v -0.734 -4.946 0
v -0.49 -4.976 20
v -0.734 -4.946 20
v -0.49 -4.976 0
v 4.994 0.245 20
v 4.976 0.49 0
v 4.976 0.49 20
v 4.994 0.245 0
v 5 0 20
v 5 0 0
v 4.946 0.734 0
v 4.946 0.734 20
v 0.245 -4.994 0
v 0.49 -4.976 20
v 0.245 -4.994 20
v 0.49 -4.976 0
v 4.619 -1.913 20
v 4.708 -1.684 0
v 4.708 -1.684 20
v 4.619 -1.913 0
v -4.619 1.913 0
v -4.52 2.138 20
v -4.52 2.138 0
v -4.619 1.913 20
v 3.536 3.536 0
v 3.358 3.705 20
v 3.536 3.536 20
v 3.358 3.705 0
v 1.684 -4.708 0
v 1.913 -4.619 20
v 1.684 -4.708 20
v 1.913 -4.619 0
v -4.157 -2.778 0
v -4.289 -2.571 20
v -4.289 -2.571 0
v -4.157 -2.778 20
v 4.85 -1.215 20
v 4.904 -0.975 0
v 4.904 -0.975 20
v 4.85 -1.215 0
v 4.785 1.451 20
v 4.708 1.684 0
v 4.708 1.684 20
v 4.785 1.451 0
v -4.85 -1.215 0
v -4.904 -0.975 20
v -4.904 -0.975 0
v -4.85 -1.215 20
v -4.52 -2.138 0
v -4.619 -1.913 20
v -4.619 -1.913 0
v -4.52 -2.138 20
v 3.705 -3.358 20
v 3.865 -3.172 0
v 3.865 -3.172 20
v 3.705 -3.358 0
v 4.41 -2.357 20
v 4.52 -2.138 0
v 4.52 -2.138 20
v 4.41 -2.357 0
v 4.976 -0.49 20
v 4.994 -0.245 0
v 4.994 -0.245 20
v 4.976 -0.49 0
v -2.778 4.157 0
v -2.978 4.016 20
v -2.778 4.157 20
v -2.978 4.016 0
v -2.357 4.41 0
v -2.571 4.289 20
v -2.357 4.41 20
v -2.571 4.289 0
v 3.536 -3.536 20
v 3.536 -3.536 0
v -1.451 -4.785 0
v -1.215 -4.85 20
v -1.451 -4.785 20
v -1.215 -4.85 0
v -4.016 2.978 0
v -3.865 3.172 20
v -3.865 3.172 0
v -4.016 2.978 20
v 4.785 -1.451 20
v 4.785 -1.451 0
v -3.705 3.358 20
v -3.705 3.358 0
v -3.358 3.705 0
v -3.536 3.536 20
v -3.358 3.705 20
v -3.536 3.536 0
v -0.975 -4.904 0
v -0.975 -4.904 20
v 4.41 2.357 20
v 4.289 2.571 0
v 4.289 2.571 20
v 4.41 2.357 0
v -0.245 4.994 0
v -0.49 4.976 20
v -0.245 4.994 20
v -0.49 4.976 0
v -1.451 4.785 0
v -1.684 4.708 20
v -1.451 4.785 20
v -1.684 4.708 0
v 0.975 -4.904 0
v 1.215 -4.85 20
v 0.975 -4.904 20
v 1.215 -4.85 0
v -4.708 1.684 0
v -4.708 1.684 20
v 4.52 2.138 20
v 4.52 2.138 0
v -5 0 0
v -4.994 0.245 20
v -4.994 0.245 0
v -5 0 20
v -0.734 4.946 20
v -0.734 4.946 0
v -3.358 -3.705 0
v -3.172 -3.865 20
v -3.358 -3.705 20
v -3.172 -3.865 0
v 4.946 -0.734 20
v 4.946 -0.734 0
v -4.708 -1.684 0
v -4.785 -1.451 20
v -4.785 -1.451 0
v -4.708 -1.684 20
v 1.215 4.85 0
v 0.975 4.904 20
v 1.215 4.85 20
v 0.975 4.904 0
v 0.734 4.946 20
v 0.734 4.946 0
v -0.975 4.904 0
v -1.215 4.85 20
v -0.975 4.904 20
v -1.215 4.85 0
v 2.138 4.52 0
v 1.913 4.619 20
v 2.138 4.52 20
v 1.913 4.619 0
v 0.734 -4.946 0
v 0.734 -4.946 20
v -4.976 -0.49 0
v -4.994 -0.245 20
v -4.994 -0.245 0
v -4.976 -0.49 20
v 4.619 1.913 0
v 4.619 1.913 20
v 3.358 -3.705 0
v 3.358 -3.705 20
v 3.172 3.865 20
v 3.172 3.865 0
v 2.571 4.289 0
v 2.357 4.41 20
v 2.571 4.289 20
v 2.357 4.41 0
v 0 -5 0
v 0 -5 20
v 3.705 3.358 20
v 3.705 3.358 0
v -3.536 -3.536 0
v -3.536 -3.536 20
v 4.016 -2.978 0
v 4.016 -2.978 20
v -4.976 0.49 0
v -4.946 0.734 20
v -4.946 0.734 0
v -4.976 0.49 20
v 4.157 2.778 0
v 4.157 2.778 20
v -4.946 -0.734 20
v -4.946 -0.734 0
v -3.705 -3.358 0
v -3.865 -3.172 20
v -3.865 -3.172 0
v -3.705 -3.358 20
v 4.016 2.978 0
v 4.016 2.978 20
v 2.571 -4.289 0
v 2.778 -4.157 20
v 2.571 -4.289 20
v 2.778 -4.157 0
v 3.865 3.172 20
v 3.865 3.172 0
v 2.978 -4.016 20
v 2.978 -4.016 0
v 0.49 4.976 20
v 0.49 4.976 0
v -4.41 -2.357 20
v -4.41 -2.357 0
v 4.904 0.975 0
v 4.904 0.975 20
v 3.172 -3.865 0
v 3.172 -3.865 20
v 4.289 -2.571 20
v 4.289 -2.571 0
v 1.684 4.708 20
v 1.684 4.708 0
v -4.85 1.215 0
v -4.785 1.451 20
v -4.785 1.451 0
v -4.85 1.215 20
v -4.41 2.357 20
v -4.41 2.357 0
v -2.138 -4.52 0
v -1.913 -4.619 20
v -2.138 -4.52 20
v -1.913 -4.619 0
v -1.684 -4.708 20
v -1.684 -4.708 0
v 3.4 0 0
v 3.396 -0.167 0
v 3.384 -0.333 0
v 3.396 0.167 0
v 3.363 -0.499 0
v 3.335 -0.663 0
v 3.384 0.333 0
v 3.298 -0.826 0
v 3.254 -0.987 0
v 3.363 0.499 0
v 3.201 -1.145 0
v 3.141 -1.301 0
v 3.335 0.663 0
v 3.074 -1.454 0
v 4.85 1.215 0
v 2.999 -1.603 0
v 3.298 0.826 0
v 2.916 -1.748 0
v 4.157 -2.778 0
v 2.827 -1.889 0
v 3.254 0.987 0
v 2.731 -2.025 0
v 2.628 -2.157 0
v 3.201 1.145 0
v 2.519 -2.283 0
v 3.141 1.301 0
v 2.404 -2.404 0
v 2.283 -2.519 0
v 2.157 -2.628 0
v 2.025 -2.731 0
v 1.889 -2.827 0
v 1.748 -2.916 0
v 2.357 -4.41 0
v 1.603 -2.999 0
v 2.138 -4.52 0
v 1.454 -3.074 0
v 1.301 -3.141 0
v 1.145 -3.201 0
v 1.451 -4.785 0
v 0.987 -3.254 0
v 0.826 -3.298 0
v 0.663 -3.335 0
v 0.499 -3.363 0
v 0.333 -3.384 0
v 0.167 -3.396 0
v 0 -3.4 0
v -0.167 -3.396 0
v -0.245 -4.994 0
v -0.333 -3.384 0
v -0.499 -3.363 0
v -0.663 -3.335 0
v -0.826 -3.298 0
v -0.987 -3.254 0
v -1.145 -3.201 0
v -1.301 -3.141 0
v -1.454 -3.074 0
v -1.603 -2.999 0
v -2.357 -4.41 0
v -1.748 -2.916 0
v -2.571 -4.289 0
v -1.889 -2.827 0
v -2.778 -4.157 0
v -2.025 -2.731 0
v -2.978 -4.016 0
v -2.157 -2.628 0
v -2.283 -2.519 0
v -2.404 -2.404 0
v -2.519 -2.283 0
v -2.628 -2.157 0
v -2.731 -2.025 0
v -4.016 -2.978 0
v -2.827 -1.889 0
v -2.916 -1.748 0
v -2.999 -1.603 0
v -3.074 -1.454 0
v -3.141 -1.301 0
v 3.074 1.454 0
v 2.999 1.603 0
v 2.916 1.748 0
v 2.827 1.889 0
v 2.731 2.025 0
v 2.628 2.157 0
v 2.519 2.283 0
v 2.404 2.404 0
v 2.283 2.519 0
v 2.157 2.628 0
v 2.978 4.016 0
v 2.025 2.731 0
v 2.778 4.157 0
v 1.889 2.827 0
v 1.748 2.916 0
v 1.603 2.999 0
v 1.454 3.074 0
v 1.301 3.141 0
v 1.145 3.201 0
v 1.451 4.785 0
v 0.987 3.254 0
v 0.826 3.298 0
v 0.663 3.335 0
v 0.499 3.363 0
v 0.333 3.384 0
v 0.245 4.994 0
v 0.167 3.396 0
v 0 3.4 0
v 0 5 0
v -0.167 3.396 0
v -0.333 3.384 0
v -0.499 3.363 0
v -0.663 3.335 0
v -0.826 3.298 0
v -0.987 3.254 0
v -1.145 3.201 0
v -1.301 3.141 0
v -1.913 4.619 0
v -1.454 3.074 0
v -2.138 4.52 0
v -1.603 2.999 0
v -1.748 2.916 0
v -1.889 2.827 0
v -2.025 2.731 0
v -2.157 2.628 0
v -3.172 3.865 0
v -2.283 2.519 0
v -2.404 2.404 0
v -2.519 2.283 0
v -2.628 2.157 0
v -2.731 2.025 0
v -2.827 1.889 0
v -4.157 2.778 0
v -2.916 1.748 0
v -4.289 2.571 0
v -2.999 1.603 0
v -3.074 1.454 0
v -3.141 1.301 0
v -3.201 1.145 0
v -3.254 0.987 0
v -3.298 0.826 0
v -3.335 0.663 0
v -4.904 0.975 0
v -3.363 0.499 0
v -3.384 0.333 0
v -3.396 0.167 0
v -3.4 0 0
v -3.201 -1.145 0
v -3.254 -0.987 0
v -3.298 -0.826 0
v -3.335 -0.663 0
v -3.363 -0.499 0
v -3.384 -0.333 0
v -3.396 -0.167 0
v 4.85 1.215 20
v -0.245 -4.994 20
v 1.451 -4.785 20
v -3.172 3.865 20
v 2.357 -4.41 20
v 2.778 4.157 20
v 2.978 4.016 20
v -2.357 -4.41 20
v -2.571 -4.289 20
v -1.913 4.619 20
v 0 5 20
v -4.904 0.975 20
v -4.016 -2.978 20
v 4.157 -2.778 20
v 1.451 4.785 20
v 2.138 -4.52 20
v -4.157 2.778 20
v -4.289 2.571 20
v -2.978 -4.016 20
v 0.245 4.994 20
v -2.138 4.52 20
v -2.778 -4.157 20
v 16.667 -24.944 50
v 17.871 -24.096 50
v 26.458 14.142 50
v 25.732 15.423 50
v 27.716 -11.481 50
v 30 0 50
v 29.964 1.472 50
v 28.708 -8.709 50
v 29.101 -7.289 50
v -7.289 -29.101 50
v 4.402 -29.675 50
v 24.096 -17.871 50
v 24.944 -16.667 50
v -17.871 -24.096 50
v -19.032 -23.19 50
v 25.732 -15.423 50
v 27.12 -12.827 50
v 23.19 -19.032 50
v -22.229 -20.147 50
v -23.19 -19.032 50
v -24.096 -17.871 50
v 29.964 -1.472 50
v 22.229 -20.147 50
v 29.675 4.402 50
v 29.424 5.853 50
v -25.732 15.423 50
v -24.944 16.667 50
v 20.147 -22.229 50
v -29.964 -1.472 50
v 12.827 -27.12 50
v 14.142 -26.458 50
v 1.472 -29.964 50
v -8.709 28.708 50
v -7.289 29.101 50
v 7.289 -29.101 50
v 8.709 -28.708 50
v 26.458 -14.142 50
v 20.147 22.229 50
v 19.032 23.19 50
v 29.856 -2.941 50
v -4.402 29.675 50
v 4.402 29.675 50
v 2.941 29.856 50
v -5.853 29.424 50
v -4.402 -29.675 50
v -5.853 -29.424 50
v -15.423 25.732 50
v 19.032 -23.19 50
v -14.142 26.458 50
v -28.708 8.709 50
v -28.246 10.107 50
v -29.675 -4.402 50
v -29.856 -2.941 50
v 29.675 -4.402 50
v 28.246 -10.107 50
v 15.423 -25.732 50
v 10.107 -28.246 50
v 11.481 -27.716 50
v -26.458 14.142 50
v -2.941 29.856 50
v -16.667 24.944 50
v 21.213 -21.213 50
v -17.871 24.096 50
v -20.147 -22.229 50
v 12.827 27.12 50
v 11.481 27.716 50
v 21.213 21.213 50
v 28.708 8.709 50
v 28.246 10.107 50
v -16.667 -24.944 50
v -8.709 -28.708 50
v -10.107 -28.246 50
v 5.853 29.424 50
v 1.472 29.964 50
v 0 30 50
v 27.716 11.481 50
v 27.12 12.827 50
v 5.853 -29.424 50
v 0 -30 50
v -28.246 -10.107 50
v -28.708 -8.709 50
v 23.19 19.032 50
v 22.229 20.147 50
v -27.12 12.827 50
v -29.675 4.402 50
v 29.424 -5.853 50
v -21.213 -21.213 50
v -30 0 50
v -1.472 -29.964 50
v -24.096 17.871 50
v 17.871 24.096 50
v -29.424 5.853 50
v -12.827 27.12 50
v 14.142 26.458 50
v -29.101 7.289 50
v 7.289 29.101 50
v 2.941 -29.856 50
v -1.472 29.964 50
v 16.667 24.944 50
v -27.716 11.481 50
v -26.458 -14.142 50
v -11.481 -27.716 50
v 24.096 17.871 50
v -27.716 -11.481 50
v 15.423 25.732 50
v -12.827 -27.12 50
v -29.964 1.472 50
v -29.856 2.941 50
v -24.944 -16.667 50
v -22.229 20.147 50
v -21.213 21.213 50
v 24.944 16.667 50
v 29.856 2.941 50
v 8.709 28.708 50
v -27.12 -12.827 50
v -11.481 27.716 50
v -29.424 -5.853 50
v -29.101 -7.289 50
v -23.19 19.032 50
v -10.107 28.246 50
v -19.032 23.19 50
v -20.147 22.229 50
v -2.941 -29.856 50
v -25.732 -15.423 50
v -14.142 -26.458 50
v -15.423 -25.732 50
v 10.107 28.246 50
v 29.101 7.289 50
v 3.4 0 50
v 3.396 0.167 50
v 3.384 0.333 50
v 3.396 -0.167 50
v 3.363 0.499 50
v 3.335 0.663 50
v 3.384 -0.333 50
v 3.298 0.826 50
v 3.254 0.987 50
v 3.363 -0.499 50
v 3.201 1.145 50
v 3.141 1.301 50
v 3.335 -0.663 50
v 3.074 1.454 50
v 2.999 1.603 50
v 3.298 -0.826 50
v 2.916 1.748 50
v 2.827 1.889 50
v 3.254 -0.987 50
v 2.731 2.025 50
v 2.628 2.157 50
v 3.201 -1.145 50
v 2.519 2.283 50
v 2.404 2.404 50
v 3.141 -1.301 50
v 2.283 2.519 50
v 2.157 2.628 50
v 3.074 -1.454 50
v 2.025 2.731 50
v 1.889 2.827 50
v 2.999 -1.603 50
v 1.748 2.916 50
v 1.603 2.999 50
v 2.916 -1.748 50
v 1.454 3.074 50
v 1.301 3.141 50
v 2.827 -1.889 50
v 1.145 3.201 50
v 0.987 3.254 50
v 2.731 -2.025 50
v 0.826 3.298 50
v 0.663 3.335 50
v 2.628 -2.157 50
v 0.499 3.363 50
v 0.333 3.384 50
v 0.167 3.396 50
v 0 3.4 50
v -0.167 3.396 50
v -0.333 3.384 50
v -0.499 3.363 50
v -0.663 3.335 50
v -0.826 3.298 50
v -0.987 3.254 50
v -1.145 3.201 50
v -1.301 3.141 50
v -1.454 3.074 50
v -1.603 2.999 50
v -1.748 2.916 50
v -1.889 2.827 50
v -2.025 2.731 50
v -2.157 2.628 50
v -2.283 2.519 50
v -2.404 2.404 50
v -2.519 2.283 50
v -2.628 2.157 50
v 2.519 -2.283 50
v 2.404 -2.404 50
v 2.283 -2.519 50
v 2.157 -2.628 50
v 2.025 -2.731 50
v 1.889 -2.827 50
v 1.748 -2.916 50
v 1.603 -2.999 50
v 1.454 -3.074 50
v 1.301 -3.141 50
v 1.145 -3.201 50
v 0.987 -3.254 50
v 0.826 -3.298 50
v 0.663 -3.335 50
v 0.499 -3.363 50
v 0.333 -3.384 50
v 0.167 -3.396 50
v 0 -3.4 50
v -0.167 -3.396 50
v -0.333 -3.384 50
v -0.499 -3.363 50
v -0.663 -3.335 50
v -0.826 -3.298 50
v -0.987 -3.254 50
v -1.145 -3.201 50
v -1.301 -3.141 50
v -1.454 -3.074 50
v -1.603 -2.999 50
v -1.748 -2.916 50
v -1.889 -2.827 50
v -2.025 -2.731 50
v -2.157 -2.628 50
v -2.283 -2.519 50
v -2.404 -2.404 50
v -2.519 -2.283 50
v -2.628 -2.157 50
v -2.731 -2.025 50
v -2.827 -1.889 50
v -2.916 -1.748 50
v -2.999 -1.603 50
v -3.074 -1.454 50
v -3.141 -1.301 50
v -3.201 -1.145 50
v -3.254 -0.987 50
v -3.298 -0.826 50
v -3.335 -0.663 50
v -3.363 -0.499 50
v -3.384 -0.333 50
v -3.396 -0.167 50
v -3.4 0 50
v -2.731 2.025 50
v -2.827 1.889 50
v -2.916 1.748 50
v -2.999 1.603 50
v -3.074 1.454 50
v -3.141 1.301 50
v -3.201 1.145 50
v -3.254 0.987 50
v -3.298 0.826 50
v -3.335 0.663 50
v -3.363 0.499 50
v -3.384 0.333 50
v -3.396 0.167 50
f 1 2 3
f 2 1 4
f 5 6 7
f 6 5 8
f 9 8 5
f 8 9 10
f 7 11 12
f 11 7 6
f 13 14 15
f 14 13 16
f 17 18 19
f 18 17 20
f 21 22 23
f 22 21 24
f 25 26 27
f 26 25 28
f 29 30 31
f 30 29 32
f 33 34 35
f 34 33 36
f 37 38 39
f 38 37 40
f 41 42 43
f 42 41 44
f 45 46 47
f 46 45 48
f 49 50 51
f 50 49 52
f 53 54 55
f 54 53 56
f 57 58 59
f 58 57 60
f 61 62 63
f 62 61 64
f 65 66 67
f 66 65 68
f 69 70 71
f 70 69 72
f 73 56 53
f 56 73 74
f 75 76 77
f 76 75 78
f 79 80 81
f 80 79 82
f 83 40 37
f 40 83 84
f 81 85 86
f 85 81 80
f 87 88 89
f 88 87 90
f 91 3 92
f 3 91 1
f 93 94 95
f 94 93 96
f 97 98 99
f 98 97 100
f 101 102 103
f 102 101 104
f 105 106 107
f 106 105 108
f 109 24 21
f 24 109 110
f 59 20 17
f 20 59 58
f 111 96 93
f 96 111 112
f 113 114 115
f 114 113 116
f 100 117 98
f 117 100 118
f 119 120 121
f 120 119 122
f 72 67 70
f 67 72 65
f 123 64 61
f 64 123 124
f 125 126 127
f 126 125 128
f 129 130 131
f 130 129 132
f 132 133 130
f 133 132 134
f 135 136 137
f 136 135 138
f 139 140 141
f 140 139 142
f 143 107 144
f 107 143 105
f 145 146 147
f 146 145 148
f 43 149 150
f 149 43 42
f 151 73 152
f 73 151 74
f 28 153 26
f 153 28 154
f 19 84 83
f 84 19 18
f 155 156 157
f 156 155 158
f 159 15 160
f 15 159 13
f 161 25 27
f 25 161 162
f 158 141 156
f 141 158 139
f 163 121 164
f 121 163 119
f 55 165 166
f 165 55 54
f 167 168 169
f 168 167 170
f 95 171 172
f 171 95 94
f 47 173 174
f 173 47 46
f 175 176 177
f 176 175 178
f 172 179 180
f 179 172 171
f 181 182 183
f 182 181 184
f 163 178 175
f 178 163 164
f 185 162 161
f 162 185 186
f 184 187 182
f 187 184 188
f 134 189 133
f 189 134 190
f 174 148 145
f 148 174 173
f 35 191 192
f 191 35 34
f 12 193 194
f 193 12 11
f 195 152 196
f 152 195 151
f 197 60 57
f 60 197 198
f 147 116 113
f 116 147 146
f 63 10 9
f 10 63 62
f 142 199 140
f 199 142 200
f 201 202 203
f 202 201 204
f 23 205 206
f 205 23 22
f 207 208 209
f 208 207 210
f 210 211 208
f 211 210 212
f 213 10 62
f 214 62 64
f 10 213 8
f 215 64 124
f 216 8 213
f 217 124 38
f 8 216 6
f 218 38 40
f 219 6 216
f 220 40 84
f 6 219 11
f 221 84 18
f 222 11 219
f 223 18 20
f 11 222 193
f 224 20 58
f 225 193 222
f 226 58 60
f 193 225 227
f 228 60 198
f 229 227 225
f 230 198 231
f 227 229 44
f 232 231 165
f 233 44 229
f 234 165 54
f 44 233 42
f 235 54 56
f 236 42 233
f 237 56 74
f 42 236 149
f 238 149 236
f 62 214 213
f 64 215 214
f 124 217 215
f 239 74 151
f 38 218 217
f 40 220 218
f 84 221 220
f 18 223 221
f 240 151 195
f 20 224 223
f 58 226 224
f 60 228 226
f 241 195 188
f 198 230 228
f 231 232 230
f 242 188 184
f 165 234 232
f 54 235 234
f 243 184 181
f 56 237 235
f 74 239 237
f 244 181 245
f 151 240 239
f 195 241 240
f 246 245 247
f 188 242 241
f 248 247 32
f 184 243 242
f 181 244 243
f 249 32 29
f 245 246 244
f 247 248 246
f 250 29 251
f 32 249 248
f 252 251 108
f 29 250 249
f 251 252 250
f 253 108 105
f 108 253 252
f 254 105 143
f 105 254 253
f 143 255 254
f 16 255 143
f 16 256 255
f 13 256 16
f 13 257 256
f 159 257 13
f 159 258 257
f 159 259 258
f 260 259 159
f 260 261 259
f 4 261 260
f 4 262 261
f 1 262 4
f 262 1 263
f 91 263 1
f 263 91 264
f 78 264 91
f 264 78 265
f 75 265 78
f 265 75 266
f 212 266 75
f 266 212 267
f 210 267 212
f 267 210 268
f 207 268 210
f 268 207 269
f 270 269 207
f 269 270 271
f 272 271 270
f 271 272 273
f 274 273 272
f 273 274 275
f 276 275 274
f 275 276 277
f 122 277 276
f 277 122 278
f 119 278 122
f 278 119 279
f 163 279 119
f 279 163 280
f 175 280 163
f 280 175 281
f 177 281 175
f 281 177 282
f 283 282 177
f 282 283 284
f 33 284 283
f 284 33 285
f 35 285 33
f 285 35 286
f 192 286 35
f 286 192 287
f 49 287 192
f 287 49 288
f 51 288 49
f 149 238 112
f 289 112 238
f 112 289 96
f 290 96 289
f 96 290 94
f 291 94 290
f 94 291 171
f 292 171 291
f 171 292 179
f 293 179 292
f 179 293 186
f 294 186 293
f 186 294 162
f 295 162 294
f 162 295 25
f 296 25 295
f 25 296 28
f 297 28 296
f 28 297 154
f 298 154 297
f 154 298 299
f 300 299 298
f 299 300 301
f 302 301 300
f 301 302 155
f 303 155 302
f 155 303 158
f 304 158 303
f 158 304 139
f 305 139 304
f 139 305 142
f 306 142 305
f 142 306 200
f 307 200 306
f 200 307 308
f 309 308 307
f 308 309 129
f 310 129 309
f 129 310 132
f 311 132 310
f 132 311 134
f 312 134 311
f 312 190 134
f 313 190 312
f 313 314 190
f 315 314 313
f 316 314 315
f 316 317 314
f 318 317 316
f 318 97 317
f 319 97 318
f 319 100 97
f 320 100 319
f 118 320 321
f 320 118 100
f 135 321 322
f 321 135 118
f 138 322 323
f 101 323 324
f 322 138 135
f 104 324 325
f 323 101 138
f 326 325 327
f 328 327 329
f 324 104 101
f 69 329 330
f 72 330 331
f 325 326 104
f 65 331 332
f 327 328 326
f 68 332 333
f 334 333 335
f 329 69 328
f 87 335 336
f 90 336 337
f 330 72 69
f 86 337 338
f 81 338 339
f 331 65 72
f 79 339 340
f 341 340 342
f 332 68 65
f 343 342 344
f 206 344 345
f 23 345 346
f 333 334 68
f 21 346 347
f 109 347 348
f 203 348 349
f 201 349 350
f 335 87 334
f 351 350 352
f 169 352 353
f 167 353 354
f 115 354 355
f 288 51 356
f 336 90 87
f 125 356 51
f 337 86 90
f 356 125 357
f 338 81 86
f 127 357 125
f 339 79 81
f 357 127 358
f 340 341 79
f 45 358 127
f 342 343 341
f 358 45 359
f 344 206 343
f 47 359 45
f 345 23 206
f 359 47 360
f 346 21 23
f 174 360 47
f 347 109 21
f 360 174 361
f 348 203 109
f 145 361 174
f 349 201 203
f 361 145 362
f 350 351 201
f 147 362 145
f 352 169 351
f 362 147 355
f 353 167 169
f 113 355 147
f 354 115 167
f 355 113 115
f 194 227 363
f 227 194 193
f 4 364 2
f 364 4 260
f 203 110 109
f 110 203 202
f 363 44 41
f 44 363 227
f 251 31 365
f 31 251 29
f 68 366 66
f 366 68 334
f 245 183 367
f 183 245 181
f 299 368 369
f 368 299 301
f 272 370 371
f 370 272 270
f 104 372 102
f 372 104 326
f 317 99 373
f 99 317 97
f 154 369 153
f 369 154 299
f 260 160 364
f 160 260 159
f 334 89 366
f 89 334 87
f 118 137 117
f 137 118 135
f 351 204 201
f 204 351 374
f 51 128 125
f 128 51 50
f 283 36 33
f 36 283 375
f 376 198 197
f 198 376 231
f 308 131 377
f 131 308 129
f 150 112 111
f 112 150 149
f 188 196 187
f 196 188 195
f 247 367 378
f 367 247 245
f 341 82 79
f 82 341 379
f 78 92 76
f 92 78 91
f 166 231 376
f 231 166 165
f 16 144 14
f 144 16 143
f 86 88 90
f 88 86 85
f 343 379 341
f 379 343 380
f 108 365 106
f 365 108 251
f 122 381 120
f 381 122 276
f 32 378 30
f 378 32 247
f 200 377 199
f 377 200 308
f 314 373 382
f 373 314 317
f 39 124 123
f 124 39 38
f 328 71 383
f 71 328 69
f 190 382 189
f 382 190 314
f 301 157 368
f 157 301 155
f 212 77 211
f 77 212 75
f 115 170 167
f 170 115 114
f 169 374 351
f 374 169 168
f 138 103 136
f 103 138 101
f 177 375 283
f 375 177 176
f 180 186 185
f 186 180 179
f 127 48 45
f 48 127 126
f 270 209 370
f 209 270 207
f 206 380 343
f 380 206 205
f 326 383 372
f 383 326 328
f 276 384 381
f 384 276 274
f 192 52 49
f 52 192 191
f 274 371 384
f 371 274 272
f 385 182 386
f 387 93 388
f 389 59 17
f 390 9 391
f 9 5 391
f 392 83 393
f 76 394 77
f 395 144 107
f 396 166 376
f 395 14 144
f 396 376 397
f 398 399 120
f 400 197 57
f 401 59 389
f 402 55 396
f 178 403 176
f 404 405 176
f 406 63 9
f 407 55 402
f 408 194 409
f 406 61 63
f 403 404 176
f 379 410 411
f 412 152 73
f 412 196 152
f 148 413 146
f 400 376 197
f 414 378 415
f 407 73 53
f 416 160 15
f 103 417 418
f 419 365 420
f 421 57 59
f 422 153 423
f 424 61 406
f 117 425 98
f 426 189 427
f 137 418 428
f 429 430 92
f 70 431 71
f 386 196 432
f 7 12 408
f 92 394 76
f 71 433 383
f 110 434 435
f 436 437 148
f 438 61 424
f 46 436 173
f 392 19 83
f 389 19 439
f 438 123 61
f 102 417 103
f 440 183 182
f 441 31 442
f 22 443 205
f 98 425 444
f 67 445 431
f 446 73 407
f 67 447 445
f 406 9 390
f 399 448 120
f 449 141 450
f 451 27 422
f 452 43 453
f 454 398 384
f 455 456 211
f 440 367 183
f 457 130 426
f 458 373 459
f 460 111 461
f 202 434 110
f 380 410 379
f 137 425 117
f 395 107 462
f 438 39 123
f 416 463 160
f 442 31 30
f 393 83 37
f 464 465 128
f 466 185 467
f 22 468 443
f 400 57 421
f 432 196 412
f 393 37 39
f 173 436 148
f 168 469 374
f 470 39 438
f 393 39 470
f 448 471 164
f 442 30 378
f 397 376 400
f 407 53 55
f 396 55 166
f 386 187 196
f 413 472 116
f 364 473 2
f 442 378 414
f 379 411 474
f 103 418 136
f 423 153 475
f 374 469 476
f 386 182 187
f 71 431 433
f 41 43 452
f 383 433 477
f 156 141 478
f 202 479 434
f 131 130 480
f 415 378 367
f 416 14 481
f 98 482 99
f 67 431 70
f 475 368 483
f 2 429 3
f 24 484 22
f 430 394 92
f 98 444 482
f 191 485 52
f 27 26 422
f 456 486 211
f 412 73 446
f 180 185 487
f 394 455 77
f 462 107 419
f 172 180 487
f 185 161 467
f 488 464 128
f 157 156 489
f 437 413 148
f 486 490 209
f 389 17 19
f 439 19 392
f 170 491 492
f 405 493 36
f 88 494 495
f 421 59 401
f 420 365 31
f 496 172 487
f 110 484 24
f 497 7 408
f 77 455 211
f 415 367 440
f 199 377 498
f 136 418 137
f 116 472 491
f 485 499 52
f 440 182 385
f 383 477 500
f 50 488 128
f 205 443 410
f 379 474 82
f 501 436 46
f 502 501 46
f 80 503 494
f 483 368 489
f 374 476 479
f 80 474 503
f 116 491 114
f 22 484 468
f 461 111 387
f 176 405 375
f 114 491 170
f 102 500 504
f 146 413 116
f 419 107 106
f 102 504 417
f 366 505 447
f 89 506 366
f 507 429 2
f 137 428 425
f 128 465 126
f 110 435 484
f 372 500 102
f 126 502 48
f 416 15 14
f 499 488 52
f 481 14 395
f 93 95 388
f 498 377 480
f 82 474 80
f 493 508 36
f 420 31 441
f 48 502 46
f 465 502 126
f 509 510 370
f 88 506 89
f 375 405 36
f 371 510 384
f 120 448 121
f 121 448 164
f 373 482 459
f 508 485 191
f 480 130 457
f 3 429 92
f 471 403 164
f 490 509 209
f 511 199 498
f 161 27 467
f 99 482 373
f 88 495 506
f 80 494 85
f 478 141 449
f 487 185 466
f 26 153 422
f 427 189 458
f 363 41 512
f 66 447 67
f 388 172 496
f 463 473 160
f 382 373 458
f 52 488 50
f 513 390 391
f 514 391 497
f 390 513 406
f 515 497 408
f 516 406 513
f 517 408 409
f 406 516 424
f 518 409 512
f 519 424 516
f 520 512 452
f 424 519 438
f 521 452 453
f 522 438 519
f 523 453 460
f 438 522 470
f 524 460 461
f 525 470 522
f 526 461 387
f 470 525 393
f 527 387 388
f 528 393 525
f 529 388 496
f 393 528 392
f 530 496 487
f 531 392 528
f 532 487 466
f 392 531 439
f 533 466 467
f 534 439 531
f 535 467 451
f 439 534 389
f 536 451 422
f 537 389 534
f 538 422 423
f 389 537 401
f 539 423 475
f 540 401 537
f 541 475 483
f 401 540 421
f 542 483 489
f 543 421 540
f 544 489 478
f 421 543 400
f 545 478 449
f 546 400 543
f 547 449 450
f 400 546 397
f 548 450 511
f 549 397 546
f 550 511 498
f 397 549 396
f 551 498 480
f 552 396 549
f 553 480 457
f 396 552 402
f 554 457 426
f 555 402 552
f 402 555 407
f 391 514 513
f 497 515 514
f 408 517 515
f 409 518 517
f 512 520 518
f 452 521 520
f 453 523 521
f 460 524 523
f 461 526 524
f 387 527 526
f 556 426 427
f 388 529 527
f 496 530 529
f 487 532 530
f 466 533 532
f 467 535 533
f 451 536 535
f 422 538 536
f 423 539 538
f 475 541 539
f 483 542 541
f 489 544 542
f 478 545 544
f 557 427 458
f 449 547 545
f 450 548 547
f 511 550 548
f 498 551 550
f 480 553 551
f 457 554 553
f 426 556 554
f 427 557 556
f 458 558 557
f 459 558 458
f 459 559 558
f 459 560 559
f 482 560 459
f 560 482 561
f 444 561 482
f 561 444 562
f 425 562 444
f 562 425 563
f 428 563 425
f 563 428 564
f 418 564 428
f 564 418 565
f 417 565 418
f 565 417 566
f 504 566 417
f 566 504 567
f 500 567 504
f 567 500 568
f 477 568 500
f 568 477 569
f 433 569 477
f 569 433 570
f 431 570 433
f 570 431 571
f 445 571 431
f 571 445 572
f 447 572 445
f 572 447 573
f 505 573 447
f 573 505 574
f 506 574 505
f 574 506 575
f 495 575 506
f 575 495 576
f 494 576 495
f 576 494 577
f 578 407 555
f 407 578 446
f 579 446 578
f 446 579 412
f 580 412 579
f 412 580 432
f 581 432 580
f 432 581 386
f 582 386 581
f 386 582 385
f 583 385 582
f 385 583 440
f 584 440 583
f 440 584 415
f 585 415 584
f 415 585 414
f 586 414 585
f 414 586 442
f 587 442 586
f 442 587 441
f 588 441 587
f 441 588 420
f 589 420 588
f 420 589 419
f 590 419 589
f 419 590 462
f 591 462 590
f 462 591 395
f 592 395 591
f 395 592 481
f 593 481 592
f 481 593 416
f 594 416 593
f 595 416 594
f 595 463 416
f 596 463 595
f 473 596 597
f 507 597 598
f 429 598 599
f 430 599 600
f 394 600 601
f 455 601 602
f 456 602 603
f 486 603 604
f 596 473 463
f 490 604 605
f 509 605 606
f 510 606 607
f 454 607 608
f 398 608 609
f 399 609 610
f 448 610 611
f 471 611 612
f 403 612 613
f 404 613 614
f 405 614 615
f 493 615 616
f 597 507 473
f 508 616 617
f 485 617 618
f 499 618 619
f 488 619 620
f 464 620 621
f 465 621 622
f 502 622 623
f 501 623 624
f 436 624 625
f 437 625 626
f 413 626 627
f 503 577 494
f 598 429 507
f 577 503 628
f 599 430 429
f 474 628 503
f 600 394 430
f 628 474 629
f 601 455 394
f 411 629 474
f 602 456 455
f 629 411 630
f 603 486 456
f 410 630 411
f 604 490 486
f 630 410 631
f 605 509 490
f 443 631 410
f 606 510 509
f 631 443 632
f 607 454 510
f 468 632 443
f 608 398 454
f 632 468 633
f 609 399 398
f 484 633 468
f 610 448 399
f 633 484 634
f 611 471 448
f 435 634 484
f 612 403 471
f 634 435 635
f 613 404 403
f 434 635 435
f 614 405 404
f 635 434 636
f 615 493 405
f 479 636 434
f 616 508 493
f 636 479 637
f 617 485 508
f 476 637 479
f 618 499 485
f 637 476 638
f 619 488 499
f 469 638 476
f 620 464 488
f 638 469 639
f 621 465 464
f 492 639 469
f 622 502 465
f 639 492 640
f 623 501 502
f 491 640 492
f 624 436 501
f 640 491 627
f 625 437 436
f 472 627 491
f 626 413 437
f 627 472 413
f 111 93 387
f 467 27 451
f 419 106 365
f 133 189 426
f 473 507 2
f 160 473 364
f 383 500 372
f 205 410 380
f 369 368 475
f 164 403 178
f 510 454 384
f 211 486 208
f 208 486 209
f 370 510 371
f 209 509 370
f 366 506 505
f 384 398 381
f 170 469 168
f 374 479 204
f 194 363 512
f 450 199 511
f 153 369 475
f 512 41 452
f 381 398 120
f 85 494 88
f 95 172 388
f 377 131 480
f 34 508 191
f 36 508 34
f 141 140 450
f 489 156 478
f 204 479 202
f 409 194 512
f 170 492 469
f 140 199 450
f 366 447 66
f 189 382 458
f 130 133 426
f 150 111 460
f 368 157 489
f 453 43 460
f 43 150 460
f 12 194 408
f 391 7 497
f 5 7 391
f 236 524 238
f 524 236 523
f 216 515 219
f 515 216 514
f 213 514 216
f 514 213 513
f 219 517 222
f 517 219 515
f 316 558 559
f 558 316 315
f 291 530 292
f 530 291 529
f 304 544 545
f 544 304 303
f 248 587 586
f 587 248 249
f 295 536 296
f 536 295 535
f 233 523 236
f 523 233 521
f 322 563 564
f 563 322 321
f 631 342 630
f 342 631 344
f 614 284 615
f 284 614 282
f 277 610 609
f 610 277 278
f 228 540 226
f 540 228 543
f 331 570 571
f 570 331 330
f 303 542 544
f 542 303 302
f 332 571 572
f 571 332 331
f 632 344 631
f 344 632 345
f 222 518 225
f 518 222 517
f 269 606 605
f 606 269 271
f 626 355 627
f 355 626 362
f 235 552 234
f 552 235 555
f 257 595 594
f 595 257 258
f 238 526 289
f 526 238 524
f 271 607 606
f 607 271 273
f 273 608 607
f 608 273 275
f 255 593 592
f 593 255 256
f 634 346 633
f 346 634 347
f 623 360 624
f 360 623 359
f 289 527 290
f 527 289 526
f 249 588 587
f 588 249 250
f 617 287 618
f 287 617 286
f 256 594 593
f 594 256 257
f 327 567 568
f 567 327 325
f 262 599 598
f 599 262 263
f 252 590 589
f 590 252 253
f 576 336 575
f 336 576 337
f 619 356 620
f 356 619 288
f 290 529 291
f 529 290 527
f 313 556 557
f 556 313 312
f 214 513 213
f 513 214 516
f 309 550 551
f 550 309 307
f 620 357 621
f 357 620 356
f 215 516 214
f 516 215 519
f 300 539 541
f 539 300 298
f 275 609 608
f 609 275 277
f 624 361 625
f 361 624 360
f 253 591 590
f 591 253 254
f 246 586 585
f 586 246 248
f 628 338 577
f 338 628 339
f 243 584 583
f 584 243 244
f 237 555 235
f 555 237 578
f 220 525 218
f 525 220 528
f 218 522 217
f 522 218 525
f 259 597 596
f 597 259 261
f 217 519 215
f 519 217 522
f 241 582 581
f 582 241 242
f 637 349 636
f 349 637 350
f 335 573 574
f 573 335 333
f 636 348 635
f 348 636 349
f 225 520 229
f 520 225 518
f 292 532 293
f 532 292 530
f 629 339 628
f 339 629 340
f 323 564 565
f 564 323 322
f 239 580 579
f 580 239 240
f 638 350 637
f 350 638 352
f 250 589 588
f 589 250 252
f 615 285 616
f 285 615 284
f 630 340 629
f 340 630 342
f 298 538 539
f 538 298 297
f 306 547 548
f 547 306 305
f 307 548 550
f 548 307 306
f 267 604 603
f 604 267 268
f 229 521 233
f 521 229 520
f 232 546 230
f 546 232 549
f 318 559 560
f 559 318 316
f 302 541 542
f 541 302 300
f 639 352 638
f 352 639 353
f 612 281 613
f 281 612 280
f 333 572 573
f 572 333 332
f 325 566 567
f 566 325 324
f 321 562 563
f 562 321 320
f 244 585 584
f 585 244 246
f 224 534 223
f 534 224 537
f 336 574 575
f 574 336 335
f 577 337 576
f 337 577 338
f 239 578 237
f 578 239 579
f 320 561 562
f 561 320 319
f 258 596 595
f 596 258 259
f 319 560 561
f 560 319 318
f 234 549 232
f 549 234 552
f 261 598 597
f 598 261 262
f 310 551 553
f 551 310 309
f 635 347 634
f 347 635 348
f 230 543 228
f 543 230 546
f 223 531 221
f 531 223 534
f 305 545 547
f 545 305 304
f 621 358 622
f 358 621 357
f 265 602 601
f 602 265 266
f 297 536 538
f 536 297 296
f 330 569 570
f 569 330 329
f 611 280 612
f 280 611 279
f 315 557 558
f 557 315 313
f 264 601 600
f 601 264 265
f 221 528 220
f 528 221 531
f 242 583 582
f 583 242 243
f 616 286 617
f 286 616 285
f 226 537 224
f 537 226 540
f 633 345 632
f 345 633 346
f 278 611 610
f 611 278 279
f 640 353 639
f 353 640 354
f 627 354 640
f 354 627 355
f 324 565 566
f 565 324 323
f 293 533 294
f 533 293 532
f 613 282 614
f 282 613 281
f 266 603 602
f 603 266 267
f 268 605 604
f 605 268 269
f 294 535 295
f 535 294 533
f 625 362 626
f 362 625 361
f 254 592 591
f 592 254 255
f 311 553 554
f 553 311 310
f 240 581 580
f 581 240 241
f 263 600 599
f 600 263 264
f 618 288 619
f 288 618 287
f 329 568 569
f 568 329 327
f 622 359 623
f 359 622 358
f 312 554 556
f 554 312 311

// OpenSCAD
// Small lab funnel, printed upright (wide opening at the top)
// All dimensions in millimetres

// ---- Parameters ----
spout_od      = 10;    // spout outer diameter
spout_length  = 20;    // spout runs from z = 0 to z = 20
cone_bottom_d = 10;    // cone outer diameter at z = 20
cone_top_d    = 60;    // cone outer diameter at the rim (z = 50)
rim_z         = 50;    // height of the funnel rim
wall          = 1.6;   // wall thickness everywhere

$fn = 128;             // smoothness of curved surfaces

// ---- Derived ----
spout_id = spout_od - 2 * wall;   // spout bore = 6.8 mm
cone_h   = rim_z - spout_length;  // cone height = 30 mm

// ---- Model ----
difference() {
    union() {
        // Straight spout tube from z = 0 to z = 20
        cylinder(d = spout_od, h = spout_length);

        // Cone widening from 10 mm (at z = 20) to 60 mm (at z = 50)
        translate([0, 0, spout_length])
            cylinder(d1 = cone_bottom_d, d2 = cone_top_d, h = cone_h);
    }

    // Open bottom: bore through the spout along the full height
    translate([0, 0, -1])
        cylinder(d = spout_id, h = rim_z + 2);
}
